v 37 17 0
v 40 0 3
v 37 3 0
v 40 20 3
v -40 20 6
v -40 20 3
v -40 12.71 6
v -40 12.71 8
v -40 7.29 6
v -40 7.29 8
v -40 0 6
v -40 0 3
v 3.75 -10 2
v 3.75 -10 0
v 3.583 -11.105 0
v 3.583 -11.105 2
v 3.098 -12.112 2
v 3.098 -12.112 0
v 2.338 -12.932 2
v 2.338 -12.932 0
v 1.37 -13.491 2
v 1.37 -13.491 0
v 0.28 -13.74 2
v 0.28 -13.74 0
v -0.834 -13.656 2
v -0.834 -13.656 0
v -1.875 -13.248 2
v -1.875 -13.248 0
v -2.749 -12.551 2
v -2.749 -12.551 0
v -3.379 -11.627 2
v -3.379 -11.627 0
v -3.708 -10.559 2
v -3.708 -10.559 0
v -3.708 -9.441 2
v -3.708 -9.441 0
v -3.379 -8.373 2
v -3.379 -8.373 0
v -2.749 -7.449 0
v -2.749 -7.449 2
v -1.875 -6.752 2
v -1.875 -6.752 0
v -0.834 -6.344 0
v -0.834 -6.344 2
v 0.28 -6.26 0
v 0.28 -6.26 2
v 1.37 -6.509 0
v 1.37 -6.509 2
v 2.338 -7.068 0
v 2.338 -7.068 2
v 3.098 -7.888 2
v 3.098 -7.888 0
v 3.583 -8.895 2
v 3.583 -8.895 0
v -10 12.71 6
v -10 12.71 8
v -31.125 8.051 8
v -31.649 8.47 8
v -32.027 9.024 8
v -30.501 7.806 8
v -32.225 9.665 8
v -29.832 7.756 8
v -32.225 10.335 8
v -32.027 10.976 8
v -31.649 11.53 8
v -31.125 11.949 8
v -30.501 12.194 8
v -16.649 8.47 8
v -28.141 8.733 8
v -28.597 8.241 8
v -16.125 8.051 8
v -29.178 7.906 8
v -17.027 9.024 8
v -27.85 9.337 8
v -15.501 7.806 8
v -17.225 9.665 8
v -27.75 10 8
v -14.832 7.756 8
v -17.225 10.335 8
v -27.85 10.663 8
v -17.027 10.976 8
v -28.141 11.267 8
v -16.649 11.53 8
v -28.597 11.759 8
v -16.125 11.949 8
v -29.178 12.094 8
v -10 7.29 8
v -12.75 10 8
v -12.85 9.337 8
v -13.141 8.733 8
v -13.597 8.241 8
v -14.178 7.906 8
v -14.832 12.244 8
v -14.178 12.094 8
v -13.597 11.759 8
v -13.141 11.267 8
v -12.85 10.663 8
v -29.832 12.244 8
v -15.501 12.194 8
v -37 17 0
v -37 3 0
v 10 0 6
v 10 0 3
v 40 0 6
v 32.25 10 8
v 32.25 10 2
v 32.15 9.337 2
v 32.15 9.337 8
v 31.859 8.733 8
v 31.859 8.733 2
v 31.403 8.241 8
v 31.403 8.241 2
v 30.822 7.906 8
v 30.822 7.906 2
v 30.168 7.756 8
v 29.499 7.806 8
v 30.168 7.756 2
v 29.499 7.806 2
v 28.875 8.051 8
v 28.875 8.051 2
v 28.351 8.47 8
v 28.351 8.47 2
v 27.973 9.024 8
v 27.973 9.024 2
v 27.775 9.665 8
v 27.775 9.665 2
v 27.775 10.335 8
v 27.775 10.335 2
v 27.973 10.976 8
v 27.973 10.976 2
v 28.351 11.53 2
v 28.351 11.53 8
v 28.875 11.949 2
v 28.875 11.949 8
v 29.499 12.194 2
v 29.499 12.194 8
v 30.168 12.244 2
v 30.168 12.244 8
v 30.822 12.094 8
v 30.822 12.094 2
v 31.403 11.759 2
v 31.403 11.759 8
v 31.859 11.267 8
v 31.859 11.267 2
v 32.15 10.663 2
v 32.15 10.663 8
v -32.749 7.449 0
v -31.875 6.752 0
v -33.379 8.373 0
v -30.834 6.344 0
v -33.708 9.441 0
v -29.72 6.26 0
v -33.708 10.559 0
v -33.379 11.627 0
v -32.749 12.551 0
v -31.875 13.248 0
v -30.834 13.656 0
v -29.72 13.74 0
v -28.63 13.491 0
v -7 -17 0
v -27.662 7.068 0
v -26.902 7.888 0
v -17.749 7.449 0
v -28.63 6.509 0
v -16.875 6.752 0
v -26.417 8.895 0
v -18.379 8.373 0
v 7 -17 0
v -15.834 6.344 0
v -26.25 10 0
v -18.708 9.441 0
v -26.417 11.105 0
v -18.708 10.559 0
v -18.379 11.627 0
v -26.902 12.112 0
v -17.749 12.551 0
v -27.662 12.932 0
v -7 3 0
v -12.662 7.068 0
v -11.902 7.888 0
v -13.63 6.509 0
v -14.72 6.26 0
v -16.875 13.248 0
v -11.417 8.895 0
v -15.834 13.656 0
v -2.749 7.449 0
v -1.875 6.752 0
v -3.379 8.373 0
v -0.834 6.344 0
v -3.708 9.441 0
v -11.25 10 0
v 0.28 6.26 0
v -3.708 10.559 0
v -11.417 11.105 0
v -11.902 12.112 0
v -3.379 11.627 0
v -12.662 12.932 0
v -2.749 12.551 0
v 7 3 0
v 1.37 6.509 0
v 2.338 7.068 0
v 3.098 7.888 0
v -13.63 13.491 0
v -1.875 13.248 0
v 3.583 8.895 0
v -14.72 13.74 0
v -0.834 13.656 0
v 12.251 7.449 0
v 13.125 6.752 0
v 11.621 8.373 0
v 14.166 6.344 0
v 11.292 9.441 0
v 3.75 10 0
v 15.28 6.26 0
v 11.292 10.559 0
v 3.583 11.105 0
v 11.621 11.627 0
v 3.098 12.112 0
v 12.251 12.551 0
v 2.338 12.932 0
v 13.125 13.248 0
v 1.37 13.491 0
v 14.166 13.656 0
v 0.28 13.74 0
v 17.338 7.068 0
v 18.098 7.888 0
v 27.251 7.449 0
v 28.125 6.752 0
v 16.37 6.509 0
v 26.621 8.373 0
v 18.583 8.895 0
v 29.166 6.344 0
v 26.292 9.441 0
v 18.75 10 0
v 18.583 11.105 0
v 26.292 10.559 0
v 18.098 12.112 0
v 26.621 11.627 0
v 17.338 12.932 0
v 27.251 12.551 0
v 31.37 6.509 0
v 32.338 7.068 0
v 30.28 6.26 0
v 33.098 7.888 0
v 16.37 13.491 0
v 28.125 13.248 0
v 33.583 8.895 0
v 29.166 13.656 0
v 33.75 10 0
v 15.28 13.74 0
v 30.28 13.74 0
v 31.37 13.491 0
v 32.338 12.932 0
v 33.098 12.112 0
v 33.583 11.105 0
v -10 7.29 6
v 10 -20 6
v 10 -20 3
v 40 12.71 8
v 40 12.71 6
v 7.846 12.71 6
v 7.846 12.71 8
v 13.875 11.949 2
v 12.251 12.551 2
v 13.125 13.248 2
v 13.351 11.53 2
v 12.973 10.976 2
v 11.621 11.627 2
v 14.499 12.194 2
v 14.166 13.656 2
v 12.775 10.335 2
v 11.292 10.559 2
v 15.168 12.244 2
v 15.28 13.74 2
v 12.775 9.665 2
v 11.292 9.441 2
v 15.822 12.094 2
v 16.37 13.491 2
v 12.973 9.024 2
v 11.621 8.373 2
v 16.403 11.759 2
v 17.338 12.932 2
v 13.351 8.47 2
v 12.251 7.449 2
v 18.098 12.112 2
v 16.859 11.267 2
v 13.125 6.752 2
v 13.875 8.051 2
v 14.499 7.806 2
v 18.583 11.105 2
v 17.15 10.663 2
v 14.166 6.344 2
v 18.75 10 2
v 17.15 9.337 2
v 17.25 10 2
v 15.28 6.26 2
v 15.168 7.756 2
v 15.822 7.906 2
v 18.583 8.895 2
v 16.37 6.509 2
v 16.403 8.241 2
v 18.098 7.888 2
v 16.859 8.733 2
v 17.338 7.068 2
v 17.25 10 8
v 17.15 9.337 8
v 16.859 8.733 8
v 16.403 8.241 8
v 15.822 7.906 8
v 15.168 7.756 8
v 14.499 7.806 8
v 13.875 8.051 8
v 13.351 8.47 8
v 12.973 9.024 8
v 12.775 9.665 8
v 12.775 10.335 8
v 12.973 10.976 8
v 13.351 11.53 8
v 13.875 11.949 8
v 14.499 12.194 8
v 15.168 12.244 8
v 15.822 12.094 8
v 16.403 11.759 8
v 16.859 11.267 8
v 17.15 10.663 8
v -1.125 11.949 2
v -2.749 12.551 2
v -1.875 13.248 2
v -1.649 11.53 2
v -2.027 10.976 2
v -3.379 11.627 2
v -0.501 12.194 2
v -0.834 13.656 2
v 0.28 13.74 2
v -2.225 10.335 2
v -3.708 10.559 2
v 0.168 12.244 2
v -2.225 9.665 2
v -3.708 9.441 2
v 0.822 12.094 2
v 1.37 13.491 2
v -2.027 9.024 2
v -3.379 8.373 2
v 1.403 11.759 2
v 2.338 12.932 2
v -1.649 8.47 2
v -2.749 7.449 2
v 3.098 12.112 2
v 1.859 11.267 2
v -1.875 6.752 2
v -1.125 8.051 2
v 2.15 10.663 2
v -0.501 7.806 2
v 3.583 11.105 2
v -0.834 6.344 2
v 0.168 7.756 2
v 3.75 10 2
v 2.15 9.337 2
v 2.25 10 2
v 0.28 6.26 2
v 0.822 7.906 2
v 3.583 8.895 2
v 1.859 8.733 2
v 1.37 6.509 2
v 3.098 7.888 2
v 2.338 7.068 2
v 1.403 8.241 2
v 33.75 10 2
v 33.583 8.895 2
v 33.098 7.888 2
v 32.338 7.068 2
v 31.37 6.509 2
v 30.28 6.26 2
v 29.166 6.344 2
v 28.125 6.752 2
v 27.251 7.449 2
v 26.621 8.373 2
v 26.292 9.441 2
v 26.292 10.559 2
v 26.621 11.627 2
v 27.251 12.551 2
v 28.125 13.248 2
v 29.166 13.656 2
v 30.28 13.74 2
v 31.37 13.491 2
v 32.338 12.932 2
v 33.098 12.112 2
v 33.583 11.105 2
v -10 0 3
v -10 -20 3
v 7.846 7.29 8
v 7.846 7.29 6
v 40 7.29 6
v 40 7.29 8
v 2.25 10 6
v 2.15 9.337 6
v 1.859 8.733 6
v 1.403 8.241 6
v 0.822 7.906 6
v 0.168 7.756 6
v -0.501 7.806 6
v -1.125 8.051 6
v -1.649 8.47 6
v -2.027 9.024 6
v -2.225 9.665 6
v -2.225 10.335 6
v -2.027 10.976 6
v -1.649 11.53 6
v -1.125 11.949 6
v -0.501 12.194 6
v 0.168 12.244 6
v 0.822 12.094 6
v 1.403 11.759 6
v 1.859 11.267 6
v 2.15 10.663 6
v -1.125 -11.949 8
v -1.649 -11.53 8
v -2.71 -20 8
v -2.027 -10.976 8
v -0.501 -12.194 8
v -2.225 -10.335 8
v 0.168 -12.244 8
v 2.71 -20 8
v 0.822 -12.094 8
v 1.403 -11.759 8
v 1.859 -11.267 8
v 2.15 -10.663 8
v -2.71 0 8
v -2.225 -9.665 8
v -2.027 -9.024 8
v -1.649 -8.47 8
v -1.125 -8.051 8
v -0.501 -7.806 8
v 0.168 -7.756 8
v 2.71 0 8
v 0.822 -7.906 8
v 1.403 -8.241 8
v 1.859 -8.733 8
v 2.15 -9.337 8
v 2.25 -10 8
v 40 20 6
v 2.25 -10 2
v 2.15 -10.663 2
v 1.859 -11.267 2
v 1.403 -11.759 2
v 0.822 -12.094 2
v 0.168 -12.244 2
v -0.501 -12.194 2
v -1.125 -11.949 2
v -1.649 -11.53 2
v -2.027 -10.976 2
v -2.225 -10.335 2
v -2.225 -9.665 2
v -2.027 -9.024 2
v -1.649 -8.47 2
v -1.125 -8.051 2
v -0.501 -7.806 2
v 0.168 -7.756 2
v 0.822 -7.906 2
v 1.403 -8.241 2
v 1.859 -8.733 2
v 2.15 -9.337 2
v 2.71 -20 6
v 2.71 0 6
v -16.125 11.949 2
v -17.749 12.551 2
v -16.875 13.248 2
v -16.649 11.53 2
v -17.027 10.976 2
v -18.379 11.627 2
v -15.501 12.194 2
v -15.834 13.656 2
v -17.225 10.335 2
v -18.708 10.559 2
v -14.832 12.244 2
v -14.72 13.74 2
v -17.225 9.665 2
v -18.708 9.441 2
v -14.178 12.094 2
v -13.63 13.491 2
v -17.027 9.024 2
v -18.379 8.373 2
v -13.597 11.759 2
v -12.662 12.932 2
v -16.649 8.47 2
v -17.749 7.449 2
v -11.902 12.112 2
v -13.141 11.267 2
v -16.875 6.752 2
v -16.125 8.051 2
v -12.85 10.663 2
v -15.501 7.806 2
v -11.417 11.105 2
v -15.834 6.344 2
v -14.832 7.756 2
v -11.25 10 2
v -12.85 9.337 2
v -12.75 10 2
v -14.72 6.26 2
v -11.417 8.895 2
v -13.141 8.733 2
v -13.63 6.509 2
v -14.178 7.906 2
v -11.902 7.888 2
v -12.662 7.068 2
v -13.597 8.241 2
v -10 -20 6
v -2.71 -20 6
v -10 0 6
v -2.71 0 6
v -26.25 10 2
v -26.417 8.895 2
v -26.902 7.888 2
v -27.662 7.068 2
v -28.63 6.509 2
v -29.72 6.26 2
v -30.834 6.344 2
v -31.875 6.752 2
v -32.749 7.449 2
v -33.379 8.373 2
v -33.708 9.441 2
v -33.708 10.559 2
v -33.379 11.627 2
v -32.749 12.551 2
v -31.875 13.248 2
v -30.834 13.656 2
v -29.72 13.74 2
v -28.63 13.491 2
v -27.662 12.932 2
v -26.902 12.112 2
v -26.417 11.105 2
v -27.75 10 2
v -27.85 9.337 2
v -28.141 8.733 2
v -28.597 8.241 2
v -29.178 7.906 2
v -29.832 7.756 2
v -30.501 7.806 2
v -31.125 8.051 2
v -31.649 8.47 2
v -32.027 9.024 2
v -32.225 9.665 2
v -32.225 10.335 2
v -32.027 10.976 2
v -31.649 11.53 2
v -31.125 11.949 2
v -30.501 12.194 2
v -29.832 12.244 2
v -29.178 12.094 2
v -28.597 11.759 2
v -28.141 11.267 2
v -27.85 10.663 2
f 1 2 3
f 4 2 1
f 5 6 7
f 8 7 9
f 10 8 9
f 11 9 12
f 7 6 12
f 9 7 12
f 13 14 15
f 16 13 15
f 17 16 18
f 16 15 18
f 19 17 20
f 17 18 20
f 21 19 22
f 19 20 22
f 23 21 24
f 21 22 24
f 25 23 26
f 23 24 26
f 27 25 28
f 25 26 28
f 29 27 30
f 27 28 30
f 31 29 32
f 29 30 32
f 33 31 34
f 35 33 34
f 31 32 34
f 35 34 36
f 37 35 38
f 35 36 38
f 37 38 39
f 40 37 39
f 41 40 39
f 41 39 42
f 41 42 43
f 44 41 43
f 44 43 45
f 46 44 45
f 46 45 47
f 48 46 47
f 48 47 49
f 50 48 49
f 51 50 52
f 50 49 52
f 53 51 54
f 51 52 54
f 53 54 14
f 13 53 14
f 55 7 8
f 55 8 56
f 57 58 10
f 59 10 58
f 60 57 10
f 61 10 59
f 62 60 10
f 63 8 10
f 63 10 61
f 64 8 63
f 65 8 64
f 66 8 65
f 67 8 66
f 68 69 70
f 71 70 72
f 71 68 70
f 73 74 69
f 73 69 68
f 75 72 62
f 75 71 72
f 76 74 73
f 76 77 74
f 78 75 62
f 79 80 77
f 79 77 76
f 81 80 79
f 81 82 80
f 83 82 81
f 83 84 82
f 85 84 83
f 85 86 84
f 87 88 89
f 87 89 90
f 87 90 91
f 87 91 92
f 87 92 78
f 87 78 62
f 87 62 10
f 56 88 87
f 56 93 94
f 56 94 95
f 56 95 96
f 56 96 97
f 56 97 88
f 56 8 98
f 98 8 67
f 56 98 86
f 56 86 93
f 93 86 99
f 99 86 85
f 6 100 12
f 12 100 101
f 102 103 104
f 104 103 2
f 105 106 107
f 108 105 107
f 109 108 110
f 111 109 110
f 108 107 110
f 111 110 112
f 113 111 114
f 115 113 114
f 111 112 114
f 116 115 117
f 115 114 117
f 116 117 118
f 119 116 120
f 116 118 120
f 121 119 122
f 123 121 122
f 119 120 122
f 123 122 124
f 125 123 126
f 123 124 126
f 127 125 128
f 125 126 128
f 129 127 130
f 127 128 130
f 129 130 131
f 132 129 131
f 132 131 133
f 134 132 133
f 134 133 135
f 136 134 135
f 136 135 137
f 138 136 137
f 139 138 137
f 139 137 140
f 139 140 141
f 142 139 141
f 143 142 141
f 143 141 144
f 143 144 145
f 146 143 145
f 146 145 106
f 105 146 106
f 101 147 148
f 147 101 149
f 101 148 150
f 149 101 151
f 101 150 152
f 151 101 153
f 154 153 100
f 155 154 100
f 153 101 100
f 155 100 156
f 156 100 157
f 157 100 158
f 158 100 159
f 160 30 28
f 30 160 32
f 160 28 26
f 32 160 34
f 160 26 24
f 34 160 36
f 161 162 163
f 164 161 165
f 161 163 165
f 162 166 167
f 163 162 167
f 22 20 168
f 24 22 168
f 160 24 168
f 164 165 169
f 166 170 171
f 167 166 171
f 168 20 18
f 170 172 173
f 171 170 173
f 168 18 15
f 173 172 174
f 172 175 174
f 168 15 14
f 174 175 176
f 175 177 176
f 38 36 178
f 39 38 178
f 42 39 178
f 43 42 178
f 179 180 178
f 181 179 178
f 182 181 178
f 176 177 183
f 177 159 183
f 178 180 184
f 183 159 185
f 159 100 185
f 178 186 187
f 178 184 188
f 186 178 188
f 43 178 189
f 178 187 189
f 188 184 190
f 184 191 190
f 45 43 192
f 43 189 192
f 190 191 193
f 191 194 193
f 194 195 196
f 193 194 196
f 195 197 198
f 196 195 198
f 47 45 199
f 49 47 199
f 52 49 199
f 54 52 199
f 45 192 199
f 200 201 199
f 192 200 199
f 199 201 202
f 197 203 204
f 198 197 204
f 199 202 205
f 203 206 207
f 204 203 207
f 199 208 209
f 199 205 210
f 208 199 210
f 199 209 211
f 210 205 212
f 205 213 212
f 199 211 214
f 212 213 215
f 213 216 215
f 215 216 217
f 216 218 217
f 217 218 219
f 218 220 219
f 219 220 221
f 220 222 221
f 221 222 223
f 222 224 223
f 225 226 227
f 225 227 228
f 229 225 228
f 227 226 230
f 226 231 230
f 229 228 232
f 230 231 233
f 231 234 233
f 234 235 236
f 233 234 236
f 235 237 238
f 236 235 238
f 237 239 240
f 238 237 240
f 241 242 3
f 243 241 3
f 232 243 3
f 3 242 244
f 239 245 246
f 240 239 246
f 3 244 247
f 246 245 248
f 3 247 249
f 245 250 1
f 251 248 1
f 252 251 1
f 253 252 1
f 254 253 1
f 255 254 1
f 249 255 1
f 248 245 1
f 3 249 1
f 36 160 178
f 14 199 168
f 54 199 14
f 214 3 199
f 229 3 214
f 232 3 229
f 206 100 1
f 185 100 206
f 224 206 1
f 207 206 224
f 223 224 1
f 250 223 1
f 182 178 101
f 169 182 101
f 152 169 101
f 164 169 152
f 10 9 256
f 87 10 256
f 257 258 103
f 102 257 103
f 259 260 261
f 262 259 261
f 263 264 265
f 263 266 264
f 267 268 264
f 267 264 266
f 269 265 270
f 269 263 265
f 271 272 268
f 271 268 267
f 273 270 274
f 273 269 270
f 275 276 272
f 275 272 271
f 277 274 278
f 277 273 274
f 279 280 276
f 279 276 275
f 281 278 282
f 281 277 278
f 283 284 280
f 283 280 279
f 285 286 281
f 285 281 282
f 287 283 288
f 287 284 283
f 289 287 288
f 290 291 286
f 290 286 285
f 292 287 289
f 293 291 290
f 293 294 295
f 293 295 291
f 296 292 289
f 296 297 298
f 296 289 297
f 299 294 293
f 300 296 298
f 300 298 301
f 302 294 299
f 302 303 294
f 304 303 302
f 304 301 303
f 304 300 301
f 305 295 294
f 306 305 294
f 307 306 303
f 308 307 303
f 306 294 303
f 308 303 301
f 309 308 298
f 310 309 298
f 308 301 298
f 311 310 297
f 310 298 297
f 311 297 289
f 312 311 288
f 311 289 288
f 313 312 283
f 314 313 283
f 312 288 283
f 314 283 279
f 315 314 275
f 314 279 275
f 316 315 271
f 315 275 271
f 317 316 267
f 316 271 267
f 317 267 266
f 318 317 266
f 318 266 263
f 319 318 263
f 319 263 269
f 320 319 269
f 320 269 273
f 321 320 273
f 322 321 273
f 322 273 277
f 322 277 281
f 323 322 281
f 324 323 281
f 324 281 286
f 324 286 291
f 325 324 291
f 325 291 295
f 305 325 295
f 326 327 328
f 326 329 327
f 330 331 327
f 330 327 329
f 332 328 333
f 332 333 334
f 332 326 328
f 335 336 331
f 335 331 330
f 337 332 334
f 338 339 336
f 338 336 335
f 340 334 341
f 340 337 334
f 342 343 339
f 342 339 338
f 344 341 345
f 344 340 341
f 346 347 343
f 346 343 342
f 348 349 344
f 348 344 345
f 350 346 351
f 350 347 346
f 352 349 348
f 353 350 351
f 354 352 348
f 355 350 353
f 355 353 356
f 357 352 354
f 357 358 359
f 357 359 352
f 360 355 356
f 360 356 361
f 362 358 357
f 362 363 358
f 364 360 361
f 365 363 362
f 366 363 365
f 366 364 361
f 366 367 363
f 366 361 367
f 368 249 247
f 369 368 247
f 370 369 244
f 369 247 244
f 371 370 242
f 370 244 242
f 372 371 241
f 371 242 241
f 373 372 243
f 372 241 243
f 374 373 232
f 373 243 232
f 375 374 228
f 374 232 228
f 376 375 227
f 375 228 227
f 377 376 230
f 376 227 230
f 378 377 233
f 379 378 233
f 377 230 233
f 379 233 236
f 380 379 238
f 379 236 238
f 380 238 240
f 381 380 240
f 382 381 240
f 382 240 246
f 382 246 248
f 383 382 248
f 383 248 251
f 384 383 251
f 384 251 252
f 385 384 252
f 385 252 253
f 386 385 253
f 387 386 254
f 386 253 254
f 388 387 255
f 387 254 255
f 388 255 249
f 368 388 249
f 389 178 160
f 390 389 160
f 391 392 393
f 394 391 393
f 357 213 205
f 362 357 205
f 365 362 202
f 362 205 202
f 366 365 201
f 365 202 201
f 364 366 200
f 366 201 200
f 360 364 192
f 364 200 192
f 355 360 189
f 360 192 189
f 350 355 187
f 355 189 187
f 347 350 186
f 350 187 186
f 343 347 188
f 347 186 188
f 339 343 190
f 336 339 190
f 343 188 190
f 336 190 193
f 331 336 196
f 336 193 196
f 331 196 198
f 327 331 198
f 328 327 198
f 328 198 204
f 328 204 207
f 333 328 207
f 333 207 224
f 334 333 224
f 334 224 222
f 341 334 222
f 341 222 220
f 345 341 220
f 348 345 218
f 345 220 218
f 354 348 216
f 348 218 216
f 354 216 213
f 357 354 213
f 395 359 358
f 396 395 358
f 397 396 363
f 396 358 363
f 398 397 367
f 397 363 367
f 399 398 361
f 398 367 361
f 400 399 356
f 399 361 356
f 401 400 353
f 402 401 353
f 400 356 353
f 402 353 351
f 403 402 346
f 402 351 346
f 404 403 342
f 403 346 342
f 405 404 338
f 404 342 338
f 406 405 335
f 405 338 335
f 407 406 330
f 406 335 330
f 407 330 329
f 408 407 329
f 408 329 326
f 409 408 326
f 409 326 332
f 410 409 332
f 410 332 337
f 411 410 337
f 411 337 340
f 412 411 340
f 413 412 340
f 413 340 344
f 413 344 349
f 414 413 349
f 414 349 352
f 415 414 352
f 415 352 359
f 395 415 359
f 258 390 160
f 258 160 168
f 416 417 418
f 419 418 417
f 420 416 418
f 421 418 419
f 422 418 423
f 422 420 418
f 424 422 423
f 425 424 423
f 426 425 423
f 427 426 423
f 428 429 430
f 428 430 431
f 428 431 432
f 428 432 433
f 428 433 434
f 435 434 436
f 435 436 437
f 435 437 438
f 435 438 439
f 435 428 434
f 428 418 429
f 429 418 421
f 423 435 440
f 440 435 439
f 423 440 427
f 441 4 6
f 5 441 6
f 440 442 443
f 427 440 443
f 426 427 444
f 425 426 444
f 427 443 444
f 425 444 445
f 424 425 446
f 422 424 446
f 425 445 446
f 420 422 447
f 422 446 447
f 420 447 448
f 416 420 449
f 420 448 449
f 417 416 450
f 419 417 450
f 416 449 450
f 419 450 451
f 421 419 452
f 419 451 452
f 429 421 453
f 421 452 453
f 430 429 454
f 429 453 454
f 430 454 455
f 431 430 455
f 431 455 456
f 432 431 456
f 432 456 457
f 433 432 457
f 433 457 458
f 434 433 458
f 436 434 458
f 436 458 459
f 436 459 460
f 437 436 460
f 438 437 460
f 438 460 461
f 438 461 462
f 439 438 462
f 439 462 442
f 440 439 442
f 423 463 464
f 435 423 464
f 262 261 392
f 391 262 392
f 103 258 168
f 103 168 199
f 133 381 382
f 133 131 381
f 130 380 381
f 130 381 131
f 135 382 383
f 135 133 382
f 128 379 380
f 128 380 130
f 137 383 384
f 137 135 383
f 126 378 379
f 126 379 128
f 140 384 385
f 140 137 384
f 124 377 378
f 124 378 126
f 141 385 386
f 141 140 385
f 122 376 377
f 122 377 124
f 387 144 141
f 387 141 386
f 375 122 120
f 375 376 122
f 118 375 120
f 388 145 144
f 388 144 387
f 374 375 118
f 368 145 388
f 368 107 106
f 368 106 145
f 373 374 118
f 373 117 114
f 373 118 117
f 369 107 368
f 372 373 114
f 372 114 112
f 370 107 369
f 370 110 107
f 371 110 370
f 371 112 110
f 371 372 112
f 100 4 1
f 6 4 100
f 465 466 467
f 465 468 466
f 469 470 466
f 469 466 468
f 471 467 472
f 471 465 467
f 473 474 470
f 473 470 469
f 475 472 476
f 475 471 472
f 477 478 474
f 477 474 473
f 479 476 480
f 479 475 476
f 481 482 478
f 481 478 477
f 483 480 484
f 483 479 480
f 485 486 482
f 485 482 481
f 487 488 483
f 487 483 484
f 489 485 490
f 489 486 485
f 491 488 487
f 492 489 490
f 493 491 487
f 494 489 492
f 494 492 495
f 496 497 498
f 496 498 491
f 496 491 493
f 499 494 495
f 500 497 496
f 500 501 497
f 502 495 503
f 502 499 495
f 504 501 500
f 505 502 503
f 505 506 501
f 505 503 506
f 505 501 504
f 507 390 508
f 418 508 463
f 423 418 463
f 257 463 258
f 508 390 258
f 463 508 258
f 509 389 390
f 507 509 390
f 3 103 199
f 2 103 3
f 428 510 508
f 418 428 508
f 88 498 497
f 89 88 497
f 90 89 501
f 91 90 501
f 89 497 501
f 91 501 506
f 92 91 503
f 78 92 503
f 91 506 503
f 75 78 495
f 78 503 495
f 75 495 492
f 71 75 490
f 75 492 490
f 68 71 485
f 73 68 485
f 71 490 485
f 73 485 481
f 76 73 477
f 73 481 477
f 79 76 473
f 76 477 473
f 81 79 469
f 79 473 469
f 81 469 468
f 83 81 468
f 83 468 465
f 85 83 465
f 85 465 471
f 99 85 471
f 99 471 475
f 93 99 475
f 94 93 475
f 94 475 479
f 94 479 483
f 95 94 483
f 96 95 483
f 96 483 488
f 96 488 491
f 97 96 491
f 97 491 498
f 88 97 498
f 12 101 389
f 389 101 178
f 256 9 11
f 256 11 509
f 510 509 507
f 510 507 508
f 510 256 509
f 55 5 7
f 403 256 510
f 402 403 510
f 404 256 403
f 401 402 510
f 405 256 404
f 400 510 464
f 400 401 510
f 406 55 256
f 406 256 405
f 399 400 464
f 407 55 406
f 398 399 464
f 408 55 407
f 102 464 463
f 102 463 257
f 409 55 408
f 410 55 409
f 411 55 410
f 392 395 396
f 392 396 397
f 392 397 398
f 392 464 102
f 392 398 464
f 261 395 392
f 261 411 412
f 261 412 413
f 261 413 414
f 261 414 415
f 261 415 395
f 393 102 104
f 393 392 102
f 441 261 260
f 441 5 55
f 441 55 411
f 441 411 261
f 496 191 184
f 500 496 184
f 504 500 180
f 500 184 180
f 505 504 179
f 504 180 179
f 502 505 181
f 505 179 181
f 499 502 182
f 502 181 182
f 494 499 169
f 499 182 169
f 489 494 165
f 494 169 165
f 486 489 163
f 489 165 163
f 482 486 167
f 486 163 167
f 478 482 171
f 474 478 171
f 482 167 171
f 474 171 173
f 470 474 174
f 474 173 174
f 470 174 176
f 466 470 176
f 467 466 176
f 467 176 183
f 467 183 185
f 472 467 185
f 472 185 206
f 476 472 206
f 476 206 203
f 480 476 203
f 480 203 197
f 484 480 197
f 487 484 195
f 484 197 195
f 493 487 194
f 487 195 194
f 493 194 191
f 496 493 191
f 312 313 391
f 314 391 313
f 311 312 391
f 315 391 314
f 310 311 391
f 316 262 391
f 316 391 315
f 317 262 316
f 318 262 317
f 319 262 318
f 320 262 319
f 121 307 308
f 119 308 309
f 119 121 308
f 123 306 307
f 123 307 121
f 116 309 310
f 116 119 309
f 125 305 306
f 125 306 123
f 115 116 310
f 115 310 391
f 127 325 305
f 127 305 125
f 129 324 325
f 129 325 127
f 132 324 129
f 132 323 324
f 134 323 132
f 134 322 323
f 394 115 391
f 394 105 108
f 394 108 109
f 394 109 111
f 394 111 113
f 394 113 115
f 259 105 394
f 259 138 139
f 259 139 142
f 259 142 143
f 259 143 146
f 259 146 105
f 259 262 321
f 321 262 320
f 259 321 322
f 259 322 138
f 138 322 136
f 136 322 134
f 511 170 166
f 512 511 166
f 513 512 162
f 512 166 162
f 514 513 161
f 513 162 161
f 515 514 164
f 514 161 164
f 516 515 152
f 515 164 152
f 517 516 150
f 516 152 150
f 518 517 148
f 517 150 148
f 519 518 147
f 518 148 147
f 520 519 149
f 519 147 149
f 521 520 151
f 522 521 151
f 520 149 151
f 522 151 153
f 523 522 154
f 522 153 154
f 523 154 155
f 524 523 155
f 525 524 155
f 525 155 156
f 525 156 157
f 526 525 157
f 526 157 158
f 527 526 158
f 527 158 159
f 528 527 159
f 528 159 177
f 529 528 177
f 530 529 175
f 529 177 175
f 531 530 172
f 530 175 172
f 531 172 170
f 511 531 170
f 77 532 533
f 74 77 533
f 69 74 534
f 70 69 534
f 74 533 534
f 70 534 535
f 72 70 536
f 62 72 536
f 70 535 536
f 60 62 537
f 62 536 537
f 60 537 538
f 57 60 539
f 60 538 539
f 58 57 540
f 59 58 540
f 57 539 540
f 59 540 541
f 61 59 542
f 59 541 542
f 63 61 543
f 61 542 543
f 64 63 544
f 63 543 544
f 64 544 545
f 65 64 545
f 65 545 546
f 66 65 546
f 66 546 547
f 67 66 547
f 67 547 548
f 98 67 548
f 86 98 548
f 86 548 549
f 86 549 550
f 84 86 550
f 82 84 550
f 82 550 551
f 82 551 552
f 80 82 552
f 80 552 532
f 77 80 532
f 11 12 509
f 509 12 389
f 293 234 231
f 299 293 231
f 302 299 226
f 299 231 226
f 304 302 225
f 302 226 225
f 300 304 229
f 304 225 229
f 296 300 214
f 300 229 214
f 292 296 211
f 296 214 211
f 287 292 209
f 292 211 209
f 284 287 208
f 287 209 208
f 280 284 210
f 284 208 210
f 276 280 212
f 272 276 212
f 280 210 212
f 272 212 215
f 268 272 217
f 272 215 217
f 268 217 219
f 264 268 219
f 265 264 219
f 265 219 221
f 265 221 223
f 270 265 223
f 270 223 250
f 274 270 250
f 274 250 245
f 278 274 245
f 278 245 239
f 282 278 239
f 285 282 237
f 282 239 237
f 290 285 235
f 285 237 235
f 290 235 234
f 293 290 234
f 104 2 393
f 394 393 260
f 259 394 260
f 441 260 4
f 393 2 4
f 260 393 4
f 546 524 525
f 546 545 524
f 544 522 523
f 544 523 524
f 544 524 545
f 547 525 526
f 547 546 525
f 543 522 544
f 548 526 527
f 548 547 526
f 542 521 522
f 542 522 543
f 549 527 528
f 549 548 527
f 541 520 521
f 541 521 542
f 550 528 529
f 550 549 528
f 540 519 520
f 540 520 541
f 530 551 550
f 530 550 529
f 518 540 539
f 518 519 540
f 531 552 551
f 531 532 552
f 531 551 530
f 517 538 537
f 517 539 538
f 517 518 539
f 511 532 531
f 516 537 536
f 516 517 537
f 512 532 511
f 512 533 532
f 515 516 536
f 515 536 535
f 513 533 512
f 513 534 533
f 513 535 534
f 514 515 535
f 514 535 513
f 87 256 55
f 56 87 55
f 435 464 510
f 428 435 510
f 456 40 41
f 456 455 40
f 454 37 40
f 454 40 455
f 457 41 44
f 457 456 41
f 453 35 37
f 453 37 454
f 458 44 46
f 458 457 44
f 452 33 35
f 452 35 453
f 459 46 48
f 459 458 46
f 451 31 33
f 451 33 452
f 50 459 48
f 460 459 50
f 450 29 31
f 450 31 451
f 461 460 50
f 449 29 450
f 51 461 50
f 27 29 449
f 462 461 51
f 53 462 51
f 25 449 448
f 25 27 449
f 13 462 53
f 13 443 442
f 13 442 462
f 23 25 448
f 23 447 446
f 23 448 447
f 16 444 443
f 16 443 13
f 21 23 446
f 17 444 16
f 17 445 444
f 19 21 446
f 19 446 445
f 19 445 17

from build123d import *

# Parameters (mm, degrees)
F1_DEPTH = 6
F2_W     = 30
F2_H     = 5.42
F3_DEPTH = 2
F4_R     = 2.25
F5_DEPTH = 8.001
F6_R     = 3.75
F7_DEPTH = 2
F8_SIZE  = 3


with BuildPart() as f1:
    # F0 (on Top) → F1 (new body)
    with BuildSketch(Plane.XY):
        Polygon((-40, 0), (-10, 0), (-10, -20), (0, -20), (10, -20), (10, 0), (40, 0), (40, 20), (0, 20), (-40, 20), align=None)
    extrude(amount=F1_DEPTH)

    # F2 (on face) → F3 (join)
    with BuildSketch(Plane.XY.offset(6)):
        Polygon((2.71, 0), (0, 0), (-2.71, 0), (-2.71, -20), (2.71, -20), align=None)
        Polygon((7.845558, 12.71), (7.845558, 10), (7.845558, 7.29), (40, 7.29), (40, 12.71), align=None)
        with Locations((-25, 10)):
            Rectangle(F2_W, F2_H)
    extrude(amount=F3_DEPTH)

    # F4 (on face) → F5 (cut, through all)
    with BuildSketch(Plane(origin=(0, 0, 0), x_dir=(1, 0, 0), z_dir=(0, 0, -1))):
        with Locations((-30, -10)):
            Circle(F4_R)
        with Locations((0, -10)):
            Circle(F4_R)
        with Locations((0, 10)):
            Circle(F4_R)
        with Locations((30, -10)):
            Circle(F4_R)
        with Locations((15, -10)):
            Circle(F4_R)
        with Locations((-15, -10)):
            Circle(F4_R)
    extrude(amount=-F5_DEPTH, mode=Mode.SUBTRACT)

    # F6 (on face) → F7 (cut)
    with BuildSketch(Plane(origin=(0, 0, 0), x_dir=(1, 0, 0), z_dir=(0, 0, -1))):
        with Locations((0, 10)):
            Circle(F6_R)
        with Locations((0, -10)):
            Circle(F6_R)
        with Locations((30, -10)):
            Circle(F6_R)
        with Locations((-30, -10)):
            Circle(F6_R)
        with Locations((-15, -10)):
            Circle(F6_R)
        with Locations((15, -10)):
            Circle(F6_R)
    extrude(amount=-F7_DEPTH, mode=Mode.SUBTRACT)

    # F8
    f8_edges = [f1.edges().sort_by_distance(p)[0] for p in [
        (-10, -10, 0),
        (-25, 0, 0),
        (10, -10, 0),
        (25, 0, 0),
        (0, 20, 0),
        (40, 10, 0),
        (-40, 10, 0),
        (0, -20, 0),
    ]]
    chamfer(f8_edges, length=F8_SIZE)


solid = f1.part
